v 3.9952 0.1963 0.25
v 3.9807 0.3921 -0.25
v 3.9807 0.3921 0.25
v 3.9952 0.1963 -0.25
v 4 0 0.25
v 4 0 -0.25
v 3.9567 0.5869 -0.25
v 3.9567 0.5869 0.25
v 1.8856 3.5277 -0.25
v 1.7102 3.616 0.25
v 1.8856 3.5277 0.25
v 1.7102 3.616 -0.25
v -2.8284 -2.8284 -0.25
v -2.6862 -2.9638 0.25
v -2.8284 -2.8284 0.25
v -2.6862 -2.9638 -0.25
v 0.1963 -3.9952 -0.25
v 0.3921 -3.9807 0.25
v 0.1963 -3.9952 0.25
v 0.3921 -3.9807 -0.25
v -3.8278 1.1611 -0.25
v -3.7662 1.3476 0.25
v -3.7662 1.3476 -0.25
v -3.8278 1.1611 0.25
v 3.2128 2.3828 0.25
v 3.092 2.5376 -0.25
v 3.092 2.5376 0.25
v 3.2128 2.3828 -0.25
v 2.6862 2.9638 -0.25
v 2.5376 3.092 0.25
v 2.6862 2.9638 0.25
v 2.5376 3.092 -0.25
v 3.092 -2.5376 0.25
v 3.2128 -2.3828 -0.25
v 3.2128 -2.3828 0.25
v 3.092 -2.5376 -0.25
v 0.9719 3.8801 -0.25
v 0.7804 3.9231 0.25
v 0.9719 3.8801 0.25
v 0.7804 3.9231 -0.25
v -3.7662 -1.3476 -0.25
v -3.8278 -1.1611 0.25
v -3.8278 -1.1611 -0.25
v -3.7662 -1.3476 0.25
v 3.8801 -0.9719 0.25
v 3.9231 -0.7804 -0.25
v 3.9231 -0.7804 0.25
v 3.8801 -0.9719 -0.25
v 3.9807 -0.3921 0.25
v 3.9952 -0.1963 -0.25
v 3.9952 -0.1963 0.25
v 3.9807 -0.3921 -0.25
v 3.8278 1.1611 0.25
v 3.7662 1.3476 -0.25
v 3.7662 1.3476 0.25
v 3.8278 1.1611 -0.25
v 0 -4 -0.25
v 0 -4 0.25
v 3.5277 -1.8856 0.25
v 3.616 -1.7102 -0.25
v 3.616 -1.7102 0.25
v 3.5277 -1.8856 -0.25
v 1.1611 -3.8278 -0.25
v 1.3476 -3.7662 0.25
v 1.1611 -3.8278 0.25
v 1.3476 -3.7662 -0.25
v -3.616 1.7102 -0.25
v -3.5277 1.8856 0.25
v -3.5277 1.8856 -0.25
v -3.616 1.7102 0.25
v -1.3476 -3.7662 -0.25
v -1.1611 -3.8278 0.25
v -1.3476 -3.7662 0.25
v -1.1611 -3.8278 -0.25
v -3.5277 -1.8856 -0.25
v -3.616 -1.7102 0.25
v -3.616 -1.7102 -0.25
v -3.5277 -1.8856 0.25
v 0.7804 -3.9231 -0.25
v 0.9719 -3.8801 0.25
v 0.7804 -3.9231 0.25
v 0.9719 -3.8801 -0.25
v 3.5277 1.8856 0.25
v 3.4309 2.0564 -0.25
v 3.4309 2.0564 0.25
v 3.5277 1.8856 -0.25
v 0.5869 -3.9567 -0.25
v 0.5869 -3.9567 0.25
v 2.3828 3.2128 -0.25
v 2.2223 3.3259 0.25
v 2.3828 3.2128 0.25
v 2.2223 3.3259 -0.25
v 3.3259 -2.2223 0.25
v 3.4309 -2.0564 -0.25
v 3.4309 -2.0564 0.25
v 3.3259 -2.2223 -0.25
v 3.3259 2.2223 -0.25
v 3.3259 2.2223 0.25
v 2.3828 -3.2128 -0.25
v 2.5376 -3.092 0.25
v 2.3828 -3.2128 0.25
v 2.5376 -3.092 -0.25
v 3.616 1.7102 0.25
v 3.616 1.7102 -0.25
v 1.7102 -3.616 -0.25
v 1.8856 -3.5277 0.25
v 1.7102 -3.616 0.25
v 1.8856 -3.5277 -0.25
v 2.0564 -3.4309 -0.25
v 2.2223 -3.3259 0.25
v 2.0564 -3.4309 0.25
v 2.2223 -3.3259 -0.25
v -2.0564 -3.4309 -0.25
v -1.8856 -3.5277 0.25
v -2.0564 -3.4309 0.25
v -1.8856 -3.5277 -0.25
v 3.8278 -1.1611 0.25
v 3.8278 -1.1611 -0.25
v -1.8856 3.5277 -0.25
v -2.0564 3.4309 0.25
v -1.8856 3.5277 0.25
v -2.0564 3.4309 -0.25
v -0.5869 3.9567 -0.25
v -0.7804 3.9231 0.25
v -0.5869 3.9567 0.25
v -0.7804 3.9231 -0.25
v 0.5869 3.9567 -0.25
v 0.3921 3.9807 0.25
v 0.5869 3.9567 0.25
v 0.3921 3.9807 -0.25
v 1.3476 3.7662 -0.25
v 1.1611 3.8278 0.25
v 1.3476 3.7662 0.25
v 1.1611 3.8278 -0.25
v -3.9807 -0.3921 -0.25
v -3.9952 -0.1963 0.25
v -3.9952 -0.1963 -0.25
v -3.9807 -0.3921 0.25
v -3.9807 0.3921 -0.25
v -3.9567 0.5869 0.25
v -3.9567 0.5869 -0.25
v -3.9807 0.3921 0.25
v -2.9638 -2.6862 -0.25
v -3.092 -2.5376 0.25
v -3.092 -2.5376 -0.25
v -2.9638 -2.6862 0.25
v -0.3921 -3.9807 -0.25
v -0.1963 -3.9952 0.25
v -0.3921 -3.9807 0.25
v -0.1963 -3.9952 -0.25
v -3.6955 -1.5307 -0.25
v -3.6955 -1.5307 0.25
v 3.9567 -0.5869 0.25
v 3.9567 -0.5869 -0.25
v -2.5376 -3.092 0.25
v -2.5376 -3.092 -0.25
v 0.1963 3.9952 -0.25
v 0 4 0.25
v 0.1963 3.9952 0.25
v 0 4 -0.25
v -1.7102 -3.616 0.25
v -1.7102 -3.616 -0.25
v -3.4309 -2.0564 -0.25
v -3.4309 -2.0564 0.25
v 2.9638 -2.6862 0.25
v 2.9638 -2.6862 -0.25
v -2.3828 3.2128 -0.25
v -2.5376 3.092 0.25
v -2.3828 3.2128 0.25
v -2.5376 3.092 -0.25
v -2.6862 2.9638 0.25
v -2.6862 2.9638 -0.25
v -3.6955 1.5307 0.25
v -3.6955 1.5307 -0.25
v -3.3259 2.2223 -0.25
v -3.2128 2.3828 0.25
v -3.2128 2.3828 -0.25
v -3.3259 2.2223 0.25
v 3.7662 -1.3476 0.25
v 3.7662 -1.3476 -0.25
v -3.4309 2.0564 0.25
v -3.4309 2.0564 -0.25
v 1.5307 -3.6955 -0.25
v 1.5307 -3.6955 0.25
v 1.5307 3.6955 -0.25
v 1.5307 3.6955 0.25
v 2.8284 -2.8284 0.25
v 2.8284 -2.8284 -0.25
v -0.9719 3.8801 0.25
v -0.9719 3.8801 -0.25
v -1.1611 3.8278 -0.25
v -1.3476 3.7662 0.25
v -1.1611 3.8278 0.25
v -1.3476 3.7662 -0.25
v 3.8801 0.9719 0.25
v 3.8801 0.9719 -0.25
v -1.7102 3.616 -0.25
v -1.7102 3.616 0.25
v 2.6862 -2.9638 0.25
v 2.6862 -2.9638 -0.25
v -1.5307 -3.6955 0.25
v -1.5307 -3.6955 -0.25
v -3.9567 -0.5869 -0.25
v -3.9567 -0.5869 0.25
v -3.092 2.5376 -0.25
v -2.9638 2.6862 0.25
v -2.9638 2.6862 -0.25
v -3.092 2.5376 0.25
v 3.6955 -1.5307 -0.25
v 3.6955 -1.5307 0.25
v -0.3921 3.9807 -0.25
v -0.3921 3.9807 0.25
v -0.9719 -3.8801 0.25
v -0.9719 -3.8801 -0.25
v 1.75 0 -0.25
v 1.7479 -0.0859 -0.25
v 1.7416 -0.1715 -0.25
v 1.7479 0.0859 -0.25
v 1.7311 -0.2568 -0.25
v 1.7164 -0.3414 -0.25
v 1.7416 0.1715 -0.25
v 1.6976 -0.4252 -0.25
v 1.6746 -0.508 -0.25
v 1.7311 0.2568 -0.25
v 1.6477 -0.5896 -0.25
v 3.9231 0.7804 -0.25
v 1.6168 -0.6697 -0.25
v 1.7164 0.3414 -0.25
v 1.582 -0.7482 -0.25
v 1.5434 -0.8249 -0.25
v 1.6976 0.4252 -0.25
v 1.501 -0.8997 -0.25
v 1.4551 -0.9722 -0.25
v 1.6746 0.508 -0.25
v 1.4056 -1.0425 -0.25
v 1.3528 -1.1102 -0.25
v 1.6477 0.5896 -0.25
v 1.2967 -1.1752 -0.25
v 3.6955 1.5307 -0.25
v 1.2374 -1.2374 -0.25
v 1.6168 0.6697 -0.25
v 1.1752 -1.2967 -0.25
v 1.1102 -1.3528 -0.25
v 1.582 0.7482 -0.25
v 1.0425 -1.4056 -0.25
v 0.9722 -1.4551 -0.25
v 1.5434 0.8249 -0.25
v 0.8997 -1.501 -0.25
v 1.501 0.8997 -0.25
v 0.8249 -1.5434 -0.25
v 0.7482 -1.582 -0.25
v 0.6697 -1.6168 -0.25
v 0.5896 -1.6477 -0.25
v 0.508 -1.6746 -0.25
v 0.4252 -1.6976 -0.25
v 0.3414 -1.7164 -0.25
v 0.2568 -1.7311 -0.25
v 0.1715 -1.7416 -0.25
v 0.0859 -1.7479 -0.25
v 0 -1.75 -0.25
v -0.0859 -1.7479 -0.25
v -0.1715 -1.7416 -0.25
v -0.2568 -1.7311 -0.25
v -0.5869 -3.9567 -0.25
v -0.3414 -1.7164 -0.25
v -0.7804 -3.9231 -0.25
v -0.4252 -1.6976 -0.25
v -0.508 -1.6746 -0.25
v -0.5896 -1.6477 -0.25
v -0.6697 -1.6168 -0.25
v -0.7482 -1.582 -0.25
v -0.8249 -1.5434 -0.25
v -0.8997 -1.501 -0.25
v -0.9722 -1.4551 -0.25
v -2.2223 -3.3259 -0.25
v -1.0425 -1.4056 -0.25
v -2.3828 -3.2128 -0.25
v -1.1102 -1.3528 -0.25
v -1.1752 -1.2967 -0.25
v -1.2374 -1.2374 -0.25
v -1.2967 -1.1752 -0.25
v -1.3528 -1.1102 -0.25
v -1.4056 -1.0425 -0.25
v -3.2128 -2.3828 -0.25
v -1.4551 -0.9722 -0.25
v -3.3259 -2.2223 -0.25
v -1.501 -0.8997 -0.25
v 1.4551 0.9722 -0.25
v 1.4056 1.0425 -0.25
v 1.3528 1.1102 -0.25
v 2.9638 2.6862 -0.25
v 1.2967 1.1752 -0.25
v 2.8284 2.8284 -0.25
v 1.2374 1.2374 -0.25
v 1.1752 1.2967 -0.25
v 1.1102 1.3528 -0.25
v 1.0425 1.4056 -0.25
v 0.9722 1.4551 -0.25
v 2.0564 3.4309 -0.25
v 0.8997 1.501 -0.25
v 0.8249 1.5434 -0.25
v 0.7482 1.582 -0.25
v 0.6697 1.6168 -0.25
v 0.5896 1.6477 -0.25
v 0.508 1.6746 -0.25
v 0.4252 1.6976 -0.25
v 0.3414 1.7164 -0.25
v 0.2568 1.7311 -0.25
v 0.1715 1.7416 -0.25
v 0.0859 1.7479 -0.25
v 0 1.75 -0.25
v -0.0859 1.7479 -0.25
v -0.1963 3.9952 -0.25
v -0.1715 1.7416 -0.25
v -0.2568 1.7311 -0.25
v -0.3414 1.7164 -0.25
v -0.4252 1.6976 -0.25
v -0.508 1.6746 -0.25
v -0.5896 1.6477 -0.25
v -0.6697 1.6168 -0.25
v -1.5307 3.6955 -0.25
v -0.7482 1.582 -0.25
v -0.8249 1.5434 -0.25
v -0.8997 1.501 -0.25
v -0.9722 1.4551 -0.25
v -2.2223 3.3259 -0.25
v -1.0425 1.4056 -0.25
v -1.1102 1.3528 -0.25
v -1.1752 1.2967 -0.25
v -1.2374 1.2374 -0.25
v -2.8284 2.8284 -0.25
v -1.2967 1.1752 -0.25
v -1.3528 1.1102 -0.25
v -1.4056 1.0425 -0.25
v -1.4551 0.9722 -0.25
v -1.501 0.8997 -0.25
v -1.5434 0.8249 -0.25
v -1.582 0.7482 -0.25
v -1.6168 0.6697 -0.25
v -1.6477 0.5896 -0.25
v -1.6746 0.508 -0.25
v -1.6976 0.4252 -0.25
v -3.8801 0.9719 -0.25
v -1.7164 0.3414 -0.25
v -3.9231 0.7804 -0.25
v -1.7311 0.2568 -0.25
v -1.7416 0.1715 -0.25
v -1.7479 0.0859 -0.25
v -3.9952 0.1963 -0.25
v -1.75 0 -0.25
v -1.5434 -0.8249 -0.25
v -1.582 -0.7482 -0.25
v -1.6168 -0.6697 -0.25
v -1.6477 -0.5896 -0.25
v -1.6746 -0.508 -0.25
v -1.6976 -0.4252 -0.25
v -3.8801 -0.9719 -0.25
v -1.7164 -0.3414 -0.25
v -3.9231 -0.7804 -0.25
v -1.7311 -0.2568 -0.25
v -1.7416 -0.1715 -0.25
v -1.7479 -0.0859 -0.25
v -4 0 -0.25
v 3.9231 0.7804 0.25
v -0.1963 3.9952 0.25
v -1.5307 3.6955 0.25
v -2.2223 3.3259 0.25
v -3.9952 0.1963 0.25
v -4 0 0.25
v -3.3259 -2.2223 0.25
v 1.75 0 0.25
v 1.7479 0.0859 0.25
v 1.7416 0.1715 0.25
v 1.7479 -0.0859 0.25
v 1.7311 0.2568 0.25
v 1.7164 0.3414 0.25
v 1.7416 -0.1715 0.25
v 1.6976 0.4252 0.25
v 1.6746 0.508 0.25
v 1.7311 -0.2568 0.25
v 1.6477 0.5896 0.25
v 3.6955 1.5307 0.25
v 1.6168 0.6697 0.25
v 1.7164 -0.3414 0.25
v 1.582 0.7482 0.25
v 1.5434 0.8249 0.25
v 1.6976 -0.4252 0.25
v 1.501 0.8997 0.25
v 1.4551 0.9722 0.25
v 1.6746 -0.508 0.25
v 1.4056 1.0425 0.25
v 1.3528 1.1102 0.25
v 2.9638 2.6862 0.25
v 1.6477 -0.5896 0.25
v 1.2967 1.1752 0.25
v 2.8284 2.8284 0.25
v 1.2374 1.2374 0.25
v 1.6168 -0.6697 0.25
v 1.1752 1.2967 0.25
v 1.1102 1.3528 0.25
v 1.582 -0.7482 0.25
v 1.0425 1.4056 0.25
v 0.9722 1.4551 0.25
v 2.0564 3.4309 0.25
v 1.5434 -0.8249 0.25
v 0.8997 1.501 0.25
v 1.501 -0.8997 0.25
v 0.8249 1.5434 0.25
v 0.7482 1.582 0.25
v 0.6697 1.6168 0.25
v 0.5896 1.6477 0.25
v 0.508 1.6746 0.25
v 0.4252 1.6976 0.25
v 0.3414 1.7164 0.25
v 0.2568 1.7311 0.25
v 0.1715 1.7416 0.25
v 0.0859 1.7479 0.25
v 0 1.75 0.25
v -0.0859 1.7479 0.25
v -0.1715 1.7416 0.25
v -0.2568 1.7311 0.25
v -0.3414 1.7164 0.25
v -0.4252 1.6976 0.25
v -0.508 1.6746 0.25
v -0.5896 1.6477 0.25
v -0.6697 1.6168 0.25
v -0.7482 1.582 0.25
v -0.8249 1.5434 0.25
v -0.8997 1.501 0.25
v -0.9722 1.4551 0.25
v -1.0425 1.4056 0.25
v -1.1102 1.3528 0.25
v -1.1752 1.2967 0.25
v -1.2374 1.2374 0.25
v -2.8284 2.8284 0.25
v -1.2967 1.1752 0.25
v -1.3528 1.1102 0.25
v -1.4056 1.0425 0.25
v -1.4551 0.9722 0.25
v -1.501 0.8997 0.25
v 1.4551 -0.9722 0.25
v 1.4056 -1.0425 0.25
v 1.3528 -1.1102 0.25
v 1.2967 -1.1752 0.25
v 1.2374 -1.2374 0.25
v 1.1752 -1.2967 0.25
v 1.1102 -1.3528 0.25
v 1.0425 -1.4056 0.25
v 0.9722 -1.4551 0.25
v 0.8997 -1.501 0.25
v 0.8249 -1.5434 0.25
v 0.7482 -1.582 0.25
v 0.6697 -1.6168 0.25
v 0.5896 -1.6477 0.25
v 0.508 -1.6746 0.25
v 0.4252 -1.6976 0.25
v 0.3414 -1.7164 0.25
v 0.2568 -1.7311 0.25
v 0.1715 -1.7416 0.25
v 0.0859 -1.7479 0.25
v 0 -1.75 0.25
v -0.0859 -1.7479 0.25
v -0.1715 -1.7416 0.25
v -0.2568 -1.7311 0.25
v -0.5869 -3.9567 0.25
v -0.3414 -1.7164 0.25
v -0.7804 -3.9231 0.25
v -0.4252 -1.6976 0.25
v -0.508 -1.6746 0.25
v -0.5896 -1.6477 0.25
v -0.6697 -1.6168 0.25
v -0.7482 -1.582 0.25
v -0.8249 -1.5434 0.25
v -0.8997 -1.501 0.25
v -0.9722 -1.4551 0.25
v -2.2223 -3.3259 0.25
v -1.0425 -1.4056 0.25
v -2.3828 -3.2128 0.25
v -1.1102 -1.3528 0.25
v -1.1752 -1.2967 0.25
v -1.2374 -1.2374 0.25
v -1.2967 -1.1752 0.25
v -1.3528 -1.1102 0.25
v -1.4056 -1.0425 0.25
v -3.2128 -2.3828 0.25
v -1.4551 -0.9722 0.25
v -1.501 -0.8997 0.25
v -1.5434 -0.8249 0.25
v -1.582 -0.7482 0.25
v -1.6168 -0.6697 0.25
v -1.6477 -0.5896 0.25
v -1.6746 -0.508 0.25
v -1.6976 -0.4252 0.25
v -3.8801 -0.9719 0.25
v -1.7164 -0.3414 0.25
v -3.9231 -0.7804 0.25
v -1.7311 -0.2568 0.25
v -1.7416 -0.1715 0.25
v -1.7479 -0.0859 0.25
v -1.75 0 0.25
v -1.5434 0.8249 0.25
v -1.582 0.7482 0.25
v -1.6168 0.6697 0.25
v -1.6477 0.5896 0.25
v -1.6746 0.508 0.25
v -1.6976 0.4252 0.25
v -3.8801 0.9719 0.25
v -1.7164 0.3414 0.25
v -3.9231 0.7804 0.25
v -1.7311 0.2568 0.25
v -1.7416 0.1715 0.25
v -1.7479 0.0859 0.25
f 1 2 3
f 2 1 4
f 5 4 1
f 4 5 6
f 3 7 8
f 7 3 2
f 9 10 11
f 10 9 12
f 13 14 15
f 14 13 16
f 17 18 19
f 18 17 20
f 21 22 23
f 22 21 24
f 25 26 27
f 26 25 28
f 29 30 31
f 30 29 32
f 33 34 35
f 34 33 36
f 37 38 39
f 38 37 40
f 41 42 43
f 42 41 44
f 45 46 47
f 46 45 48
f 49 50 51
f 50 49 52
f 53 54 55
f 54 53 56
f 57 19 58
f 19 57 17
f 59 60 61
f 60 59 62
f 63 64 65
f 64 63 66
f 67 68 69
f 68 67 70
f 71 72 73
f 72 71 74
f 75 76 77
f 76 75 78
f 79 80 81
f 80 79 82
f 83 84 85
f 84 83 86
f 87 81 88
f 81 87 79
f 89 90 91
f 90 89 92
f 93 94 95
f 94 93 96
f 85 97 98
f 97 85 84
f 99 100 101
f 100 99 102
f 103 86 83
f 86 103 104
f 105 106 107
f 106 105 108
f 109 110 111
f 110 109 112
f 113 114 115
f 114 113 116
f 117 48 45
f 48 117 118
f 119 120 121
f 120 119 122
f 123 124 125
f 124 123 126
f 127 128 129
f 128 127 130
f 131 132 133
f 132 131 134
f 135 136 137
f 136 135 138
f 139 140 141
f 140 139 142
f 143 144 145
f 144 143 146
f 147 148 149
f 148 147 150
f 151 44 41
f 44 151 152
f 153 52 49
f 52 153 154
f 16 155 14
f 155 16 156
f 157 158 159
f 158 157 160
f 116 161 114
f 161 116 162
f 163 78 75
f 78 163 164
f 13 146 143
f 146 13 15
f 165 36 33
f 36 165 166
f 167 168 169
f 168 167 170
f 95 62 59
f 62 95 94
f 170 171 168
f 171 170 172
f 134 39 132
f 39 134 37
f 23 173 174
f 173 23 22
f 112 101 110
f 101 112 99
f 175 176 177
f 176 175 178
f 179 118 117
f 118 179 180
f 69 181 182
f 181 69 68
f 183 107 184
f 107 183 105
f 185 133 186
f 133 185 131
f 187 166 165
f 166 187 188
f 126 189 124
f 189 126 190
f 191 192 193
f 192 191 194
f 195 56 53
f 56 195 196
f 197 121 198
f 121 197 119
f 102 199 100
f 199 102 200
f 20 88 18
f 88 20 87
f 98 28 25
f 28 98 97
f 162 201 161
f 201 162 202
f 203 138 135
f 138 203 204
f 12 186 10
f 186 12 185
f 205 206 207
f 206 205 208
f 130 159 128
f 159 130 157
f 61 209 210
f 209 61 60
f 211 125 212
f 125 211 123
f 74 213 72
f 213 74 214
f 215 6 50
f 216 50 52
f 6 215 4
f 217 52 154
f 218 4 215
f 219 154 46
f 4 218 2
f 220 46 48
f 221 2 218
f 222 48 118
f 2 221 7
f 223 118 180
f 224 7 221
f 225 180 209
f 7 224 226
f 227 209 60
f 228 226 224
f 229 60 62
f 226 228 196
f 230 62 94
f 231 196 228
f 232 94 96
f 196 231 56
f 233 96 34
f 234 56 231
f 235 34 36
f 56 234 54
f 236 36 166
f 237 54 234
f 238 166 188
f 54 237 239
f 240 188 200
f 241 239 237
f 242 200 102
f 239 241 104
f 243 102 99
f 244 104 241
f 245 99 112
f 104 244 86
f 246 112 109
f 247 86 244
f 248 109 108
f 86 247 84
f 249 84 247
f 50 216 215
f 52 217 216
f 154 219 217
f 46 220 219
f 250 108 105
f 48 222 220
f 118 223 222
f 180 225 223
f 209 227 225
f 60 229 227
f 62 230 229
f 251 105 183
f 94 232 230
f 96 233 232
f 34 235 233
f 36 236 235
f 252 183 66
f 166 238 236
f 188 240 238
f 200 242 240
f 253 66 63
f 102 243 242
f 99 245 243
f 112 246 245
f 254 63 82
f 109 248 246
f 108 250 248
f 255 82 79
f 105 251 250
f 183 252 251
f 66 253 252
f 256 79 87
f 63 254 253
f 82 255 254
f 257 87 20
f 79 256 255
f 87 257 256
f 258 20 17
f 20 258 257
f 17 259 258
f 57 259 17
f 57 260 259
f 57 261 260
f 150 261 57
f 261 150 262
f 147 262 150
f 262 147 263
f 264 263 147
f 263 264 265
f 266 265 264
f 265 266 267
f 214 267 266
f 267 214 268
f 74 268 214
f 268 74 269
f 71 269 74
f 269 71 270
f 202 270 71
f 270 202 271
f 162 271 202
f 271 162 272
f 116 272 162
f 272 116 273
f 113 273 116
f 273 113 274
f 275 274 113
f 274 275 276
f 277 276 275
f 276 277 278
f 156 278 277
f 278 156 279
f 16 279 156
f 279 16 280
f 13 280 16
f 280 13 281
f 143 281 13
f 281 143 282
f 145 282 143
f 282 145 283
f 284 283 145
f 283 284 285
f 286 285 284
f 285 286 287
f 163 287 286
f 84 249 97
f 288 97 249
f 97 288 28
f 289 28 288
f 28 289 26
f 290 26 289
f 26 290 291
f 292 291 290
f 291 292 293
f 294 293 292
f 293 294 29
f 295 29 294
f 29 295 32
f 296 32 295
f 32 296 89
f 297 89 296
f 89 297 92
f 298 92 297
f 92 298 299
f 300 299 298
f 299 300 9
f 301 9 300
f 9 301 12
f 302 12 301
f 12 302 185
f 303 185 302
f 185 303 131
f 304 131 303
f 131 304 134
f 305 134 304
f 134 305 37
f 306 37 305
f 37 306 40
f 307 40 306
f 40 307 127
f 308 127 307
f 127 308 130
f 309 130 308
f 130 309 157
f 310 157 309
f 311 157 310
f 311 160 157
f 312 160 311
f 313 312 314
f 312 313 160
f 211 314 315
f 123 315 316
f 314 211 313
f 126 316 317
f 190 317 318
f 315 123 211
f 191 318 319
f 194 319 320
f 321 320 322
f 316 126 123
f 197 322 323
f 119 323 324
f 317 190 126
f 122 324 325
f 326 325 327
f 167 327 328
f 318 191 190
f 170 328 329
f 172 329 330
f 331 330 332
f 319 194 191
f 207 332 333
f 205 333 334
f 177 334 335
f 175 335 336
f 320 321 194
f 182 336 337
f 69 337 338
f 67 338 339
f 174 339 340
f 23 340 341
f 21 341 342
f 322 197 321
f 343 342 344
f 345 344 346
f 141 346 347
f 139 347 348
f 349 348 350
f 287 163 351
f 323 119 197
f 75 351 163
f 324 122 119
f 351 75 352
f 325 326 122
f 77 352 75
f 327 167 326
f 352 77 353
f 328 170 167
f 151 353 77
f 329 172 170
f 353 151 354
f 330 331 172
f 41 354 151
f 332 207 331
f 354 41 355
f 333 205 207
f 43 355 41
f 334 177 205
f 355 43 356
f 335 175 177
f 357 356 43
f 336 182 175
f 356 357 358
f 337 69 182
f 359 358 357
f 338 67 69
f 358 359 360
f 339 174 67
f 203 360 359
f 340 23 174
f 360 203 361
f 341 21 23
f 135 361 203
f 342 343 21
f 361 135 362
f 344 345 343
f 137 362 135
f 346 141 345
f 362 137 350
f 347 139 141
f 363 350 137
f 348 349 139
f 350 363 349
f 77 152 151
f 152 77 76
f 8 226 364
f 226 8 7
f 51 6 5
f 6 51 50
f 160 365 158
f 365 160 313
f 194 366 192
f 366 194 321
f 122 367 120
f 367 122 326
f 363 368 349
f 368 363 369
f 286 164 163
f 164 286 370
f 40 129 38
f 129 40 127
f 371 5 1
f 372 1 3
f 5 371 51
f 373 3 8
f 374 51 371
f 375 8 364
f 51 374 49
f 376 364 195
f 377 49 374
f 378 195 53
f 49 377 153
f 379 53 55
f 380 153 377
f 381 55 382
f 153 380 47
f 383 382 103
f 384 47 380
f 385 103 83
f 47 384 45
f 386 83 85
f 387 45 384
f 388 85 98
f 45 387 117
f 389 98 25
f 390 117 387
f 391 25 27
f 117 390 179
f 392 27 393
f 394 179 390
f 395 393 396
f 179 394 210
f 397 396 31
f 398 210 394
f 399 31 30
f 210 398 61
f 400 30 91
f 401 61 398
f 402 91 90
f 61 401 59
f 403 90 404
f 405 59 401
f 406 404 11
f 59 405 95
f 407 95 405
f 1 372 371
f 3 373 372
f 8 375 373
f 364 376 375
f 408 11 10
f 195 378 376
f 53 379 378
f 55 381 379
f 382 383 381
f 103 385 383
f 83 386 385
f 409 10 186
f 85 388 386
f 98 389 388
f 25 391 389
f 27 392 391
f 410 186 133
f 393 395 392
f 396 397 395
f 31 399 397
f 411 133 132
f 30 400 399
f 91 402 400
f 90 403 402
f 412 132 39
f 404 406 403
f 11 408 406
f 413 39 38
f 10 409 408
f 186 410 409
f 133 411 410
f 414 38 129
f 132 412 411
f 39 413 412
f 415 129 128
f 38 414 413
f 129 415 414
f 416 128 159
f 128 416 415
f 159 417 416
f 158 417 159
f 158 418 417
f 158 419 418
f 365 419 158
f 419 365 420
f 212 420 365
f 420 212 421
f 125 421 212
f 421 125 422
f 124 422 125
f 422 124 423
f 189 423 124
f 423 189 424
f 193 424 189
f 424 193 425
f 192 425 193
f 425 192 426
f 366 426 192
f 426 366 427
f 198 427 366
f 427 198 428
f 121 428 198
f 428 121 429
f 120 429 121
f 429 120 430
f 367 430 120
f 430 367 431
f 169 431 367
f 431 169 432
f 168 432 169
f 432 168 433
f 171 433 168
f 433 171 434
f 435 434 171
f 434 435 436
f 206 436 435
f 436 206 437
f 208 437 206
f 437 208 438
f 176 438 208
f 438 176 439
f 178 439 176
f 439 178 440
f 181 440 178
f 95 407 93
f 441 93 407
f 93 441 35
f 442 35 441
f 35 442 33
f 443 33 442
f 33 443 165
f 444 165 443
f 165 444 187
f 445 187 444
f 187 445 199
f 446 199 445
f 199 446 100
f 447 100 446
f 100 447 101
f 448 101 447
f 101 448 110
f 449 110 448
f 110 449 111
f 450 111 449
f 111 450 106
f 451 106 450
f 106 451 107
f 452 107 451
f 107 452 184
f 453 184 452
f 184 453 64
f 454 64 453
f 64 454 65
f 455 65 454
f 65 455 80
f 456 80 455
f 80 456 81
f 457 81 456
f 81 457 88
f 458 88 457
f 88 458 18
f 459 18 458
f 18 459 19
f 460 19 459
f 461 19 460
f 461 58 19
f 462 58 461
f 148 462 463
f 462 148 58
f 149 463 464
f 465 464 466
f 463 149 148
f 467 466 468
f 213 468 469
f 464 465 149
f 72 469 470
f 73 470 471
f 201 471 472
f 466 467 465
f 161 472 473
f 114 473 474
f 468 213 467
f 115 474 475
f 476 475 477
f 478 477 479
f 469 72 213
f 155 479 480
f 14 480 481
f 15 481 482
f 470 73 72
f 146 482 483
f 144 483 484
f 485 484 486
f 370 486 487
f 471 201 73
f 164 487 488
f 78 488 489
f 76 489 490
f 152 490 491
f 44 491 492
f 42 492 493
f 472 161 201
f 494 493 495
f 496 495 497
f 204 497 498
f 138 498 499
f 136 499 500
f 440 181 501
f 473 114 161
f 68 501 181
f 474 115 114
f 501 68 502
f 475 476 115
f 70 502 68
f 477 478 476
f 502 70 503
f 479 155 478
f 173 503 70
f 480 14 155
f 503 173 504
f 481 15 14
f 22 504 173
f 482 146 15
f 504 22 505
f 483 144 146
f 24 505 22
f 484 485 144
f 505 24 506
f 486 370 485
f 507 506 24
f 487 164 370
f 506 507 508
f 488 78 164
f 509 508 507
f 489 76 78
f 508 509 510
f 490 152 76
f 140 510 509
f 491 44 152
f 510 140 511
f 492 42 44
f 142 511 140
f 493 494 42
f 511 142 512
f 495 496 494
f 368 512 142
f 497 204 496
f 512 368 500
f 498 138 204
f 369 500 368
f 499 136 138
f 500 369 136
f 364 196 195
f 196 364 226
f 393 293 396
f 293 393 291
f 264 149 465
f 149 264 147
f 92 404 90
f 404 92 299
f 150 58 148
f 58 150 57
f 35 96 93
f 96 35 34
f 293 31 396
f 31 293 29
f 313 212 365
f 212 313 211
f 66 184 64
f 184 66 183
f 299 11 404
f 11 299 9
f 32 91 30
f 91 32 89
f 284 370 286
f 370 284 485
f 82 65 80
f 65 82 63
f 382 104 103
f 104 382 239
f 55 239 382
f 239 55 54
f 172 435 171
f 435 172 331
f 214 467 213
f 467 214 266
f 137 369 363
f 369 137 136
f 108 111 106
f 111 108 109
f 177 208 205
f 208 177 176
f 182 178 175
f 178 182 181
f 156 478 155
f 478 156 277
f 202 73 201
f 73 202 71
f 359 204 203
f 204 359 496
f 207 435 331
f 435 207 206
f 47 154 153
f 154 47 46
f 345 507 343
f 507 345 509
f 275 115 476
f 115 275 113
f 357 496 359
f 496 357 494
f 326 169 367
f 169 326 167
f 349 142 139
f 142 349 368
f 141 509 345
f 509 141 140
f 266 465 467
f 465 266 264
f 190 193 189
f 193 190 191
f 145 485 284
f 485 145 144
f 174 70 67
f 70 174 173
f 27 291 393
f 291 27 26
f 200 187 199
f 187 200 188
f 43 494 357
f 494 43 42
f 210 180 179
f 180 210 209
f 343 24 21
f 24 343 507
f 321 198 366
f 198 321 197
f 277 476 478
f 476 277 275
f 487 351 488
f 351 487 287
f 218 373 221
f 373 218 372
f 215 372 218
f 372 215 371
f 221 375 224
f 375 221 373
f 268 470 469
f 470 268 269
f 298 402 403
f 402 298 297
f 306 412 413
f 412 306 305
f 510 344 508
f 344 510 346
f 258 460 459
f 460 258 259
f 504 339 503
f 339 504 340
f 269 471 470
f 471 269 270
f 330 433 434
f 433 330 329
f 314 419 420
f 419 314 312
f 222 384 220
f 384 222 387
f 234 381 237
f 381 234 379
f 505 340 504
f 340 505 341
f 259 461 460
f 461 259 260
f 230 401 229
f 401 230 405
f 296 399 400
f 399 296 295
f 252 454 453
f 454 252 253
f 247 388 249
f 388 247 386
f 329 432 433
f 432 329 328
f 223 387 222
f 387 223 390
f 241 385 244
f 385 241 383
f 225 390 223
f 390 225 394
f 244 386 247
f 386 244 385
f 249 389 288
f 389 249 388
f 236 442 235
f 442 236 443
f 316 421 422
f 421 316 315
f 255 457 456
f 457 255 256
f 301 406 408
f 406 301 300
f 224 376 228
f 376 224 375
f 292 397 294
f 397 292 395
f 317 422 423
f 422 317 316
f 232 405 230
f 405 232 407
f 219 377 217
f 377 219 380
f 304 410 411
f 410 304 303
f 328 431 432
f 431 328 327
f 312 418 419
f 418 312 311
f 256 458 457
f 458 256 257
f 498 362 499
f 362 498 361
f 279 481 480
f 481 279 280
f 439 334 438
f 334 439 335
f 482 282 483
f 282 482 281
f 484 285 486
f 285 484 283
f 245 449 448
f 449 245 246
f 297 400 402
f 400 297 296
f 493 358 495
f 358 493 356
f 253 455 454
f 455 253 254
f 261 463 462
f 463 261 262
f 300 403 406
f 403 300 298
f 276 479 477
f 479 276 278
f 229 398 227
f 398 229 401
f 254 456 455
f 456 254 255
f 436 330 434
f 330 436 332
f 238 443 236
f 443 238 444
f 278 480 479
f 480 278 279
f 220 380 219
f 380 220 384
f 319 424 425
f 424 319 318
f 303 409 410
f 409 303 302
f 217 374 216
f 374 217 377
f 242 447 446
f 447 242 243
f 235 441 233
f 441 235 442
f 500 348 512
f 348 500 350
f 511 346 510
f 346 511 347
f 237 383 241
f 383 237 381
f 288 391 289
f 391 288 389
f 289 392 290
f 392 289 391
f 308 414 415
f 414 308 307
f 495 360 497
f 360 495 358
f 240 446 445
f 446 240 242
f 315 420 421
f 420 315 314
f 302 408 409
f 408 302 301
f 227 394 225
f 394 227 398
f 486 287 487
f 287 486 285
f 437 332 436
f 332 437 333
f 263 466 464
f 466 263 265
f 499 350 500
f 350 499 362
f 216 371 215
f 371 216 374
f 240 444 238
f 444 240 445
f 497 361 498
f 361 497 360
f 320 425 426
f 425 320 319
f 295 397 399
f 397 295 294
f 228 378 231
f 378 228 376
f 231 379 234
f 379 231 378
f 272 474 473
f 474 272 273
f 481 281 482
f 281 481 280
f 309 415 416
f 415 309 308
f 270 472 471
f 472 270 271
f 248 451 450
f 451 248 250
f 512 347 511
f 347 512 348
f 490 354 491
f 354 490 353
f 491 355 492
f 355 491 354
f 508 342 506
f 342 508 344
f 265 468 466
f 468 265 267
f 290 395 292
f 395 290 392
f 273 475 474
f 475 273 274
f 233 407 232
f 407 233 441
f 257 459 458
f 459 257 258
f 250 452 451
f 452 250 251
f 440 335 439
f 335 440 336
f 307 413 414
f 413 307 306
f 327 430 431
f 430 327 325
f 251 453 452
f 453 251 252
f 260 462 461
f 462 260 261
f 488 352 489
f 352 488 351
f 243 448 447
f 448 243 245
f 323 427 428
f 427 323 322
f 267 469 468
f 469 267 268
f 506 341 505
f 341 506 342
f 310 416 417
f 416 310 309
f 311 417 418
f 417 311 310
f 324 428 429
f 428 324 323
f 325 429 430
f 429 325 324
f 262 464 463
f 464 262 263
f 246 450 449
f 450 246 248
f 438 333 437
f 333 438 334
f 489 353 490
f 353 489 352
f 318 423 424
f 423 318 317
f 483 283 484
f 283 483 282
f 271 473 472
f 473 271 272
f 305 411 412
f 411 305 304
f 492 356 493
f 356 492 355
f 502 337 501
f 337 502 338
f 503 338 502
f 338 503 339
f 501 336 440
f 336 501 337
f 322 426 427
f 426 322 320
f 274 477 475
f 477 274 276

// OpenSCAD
// Flat washer parameters (mm)
inner_diameter_mm = 3.5;  //[1.75:7:0.1]
outer_diameter_mm = 8.0;  //[4:16:0.1]
thickness_mm      = 0.5;  //[0.25:1:0.05]

// Smoothness
$fn = 128;

module washer(inner_d, outer_d, h) {
    difference() {
        cylinder(d=outer_d, h=h, center=true);
        // Slightly taller cutter to guarantee a clean through-hole
        cylinder(d=inner_d, h=h + 0.2, center=true);
    }
}

// Single connected solid: just the washer
washer(inner_diameter_mm, outer_diameter_mm, thickness_mm);
